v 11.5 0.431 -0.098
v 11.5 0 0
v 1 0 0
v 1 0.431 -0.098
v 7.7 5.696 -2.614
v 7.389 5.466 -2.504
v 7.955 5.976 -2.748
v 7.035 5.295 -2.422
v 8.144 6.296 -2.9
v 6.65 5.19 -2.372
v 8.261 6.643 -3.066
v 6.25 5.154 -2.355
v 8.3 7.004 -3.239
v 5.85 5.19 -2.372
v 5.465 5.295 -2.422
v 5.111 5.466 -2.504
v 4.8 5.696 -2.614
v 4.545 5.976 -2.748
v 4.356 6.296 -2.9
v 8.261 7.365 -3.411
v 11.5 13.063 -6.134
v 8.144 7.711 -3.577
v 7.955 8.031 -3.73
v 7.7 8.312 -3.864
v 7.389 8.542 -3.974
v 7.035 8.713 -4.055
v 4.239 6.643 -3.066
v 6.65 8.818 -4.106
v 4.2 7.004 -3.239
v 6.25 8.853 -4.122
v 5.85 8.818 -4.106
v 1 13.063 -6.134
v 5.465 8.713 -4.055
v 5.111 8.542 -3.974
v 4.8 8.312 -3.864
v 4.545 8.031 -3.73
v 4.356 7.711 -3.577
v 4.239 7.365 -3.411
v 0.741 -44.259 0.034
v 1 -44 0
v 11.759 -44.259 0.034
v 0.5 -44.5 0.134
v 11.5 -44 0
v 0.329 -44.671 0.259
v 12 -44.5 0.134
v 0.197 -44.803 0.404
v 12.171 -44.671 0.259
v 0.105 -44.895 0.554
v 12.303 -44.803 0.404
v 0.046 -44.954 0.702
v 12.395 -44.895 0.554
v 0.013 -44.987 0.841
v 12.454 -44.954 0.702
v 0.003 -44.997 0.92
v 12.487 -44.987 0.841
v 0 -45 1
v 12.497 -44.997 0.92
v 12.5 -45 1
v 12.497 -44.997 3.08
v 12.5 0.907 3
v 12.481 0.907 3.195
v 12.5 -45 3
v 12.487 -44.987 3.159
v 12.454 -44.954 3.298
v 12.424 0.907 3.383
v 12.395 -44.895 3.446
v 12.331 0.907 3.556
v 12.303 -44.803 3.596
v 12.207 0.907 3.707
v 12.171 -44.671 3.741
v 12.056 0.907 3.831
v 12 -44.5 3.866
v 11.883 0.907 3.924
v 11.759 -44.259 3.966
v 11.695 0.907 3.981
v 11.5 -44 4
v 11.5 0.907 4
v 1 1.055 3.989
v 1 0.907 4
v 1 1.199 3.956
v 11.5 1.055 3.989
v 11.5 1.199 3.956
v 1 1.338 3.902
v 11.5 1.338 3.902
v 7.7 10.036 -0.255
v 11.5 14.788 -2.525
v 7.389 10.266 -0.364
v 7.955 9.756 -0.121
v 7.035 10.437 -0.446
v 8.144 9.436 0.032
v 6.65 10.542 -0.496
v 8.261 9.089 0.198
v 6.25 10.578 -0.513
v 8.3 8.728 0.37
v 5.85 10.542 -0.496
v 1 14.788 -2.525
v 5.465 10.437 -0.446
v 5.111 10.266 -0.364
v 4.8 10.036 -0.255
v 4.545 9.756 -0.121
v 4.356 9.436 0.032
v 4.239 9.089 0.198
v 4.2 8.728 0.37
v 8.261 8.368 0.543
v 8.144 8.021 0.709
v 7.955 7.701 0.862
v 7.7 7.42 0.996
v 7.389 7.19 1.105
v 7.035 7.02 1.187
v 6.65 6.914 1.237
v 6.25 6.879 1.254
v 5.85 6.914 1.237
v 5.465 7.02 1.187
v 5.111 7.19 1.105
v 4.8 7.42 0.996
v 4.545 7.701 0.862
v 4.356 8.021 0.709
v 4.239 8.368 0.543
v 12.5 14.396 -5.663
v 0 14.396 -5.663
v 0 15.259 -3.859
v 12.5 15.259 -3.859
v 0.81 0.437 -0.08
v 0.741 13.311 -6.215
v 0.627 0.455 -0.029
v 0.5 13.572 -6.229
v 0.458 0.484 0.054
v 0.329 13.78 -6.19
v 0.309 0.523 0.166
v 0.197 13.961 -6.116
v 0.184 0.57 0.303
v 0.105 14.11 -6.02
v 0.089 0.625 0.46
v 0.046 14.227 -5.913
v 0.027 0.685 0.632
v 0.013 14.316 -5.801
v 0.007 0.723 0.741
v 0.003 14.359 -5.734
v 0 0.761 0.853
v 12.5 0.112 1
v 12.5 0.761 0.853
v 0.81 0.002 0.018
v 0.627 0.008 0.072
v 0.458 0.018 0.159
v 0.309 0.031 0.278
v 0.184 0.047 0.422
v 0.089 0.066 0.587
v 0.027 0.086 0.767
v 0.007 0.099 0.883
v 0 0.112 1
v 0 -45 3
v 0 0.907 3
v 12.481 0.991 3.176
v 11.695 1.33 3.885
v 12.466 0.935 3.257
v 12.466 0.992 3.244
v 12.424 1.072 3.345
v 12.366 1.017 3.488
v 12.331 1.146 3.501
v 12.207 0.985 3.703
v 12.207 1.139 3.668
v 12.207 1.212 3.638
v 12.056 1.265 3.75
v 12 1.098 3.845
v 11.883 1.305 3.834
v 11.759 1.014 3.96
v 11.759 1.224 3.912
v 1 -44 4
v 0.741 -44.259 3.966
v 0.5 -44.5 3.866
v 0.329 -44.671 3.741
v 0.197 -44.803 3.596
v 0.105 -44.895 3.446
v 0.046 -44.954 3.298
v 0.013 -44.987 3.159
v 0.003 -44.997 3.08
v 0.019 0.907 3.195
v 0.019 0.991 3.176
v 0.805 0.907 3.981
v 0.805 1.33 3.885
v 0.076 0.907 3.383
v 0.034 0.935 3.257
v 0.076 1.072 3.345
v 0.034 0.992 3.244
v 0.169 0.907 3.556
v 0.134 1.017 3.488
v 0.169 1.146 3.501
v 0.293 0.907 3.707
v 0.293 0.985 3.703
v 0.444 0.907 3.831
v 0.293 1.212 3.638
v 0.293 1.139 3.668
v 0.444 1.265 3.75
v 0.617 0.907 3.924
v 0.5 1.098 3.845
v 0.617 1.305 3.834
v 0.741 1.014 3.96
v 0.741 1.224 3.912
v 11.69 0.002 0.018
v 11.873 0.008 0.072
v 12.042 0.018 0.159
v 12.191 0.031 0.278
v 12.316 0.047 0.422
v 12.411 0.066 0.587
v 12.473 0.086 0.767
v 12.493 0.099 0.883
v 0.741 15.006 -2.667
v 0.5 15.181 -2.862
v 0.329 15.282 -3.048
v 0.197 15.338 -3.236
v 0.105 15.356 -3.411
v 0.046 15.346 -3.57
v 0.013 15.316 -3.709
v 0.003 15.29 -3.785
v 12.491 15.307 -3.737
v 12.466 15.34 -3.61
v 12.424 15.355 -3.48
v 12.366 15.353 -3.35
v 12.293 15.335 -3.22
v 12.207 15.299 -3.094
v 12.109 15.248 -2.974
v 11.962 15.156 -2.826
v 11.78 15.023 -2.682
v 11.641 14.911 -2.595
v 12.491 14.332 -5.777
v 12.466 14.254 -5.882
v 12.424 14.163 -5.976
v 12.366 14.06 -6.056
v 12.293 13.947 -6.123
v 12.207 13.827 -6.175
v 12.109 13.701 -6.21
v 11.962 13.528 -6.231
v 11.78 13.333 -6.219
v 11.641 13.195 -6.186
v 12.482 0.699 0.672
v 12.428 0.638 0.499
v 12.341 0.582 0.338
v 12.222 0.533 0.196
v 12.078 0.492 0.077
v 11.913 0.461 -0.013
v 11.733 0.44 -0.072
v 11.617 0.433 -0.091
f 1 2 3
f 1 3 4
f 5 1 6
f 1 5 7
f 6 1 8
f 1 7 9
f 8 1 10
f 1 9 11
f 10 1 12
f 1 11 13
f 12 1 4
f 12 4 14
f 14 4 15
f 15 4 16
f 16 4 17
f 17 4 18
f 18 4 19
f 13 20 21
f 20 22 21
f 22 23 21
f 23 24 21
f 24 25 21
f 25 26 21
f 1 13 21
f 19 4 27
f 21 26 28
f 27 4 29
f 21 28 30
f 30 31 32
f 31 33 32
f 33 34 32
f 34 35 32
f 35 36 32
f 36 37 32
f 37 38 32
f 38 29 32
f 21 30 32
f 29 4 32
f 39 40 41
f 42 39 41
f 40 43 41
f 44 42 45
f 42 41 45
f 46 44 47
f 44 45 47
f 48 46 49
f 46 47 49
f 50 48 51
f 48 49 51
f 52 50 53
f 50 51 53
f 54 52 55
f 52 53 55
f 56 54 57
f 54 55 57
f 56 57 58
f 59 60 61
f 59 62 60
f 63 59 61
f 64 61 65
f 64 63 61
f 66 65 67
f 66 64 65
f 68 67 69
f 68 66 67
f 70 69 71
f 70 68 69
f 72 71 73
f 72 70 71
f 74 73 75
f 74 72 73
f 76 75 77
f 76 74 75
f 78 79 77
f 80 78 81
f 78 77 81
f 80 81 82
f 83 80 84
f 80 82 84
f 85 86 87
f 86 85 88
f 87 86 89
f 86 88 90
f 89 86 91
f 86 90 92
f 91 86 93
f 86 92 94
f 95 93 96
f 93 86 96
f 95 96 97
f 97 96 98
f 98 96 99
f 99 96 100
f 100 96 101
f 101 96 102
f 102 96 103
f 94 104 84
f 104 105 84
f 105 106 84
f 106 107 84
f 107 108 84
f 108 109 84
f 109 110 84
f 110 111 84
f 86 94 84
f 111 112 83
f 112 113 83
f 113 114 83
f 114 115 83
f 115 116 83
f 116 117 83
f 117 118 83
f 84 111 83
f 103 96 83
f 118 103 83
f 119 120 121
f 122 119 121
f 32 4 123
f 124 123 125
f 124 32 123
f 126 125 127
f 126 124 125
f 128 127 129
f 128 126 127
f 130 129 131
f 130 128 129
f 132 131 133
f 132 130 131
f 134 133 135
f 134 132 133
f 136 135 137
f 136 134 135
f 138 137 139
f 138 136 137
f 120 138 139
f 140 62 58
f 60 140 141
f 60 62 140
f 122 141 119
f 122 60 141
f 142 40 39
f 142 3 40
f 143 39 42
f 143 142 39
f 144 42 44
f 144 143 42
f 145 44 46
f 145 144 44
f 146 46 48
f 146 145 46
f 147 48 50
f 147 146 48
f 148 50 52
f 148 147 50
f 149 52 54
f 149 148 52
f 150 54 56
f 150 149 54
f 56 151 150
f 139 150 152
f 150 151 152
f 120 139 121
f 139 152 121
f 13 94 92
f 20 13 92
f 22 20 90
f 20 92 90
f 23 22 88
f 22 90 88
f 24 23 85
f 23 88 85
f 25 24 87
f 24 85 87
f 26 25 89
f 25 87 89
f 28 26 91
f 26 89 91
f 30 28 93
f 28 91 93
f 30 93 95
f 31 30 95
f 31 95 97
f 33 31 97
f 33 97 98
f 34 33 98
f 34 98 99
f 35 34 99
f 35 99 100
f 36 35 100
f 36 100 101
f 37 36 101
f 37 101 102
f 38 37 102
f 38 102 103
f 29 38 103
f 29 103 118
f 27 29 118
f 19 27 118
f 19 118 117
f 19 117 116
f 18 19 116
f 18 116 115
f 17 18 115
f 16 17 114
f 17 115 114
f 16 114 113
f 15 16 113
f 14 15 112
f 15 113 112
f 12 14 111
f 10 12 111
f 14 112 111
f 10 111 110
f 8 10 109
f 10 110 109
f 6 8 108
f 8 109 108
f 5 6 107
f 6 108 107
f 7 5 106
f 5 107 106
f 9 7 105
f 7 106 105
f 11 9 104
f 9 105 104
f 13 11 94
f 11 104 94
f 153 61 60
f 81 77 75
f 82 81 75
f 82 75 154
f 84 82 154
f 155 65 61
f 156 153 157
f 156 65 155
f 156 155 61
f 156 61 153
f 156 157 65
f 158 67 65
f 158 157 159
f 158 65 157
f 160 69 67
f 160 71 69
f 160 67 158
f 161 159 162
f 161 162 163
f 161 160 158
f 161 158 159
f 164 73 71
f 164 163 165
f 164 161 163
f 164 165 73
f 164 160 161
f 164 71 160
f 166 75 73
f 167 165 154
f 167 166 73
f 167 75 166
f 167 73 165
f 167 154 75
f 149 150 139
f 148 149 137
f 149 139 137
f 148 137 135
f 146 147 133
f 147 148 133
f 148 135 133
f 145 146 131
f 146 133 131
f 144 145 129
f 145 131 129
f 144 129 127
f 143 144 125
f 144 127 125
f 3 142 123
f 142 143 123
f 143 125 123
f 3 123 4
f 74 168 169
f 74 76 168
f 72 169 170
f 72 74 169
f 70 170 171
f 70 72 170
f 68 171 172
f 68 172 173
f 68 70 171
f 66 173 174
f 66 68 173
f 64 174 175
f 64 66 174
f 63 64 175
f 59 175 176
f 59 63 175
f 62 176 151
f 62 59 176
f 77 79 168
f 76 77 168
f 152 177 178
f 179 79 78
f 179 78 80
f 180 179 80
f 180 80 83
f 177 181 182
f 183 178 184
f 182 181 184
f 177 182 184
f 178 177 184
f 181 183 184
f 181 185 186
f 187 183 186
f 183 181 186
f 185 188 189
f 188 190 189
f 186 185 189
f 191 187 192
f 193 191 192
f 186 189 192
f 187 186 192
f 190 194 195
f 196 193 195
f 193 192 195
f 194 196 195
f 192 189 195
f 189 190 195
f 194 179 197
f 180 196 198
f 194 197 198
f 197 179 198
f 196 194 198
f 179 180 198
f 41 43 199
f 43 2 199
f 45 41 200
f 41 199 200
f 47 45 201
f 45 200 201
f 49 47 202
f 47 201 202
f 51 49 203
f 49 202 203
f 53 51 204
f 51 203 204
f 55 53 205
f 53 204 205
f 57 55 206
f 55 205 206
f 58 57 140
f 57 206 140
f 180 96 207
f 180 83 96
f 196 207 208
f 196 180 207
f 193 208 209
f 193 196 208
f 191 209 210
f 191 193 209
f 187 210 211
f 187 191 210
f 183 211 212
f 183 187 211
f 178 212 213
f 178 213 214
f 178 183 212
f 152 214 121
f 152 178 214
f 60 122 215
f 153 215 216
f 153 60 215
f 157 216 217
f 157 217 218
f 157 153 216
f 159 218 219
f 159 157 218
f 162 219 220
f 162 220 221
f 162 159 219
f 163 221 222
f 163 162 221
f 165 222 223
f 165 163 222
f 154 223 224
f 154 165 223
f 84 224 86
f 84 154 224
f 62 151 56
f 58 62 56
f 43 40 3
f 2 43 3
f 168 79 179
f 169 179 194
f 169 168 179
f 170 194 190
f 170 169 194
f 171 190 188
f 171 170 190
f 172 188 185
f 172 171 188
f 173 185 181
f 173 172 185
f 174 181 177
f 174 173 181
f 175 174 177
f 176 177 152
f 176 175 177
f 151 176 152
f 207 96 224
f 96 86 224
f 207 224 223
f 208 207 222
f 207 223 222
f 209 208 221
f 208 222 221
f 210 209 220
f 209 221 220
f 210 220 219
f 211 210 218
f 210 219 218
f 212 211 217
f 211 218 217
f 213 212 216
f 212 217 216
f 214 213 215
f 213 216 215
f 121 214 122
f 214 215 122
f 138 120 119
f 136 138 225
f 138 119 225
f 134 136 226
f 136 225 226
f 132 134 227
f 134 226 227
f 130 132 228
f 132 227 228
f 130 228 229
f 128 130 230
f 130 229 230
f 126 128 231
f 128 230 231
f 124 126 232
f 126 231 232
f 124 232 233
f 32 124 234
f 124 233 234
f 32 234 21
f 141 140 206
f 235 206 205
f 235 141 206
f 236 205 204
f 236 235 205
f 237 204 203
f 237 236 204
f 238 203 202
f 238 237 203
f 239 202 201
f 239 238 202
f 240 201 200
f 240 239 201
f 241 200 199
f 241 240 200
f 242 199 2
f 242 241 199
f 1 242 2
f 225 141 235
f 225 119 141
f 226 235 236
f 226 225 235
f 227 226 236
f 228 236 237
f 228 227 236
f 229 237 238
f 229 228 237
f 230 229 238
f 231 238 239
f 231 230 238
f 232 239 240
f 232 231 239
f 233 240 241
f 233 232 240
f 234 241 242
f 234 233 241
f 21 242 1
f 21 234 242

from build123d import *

# Parameters (mm, degrees)
F1_DEPTH = 12.5
F2_R     = 2.05
F3_DEPTH = 25
F4_R     = 1


with BuildPart() as f1:
    # F0 (on Right) → F1 (new body)
    with BuildSketch(Plane.YZ):
        Polygon((-45, 0), (0, 0), (0.431175, -0.097732), (13.965198, -6.56536), (15.689899, -2.956287), (1.133319, 4), (-45, 4), align=None)
    extrude(amount=F1_DEPTH)

    # F2 (on face) → F3 (cut)
    with BuildSketch(Plane(origin=(0, 1.76684, 3.697253), x_dir=(1, 0, 0), z_dir=(0, 0.431175, 0.902268))):
        with Locations((6.25, 7.715588)):
            Circle(F2_R)
    extrude(amount=-F3_DEPTH, mode=Mode.SUBTRACT)

    # F4
    f4_edges = [f1.edges().sort_by_distance(p)[0] for p in [
        (6.25, 1.133319, 4),
        (6.25, -45, 4),
        (0, -21.933341, 4),
        (12.5, -21.933341, 4),
        (12.5, 8.411609, 0.521856),
        (6.25, 15.689899, -2.956287),
        (0, 8.411609, 0.521856),
        (12.5, -22.5, 0),
        (0, -22.5, 0),
        (6.25, -45, 0),
        (12.5, 7.198187, -3.331546),
        (0, 7.198187, -3.331546),
        (6.25, 13.965198, -6.56536),
        (12.5, 0.215588, -0.048866),
        (0, 0.215588, -0.048866),
    ]]
    fillet(f4_edges, radius=F4_R)


solid = f1.part
